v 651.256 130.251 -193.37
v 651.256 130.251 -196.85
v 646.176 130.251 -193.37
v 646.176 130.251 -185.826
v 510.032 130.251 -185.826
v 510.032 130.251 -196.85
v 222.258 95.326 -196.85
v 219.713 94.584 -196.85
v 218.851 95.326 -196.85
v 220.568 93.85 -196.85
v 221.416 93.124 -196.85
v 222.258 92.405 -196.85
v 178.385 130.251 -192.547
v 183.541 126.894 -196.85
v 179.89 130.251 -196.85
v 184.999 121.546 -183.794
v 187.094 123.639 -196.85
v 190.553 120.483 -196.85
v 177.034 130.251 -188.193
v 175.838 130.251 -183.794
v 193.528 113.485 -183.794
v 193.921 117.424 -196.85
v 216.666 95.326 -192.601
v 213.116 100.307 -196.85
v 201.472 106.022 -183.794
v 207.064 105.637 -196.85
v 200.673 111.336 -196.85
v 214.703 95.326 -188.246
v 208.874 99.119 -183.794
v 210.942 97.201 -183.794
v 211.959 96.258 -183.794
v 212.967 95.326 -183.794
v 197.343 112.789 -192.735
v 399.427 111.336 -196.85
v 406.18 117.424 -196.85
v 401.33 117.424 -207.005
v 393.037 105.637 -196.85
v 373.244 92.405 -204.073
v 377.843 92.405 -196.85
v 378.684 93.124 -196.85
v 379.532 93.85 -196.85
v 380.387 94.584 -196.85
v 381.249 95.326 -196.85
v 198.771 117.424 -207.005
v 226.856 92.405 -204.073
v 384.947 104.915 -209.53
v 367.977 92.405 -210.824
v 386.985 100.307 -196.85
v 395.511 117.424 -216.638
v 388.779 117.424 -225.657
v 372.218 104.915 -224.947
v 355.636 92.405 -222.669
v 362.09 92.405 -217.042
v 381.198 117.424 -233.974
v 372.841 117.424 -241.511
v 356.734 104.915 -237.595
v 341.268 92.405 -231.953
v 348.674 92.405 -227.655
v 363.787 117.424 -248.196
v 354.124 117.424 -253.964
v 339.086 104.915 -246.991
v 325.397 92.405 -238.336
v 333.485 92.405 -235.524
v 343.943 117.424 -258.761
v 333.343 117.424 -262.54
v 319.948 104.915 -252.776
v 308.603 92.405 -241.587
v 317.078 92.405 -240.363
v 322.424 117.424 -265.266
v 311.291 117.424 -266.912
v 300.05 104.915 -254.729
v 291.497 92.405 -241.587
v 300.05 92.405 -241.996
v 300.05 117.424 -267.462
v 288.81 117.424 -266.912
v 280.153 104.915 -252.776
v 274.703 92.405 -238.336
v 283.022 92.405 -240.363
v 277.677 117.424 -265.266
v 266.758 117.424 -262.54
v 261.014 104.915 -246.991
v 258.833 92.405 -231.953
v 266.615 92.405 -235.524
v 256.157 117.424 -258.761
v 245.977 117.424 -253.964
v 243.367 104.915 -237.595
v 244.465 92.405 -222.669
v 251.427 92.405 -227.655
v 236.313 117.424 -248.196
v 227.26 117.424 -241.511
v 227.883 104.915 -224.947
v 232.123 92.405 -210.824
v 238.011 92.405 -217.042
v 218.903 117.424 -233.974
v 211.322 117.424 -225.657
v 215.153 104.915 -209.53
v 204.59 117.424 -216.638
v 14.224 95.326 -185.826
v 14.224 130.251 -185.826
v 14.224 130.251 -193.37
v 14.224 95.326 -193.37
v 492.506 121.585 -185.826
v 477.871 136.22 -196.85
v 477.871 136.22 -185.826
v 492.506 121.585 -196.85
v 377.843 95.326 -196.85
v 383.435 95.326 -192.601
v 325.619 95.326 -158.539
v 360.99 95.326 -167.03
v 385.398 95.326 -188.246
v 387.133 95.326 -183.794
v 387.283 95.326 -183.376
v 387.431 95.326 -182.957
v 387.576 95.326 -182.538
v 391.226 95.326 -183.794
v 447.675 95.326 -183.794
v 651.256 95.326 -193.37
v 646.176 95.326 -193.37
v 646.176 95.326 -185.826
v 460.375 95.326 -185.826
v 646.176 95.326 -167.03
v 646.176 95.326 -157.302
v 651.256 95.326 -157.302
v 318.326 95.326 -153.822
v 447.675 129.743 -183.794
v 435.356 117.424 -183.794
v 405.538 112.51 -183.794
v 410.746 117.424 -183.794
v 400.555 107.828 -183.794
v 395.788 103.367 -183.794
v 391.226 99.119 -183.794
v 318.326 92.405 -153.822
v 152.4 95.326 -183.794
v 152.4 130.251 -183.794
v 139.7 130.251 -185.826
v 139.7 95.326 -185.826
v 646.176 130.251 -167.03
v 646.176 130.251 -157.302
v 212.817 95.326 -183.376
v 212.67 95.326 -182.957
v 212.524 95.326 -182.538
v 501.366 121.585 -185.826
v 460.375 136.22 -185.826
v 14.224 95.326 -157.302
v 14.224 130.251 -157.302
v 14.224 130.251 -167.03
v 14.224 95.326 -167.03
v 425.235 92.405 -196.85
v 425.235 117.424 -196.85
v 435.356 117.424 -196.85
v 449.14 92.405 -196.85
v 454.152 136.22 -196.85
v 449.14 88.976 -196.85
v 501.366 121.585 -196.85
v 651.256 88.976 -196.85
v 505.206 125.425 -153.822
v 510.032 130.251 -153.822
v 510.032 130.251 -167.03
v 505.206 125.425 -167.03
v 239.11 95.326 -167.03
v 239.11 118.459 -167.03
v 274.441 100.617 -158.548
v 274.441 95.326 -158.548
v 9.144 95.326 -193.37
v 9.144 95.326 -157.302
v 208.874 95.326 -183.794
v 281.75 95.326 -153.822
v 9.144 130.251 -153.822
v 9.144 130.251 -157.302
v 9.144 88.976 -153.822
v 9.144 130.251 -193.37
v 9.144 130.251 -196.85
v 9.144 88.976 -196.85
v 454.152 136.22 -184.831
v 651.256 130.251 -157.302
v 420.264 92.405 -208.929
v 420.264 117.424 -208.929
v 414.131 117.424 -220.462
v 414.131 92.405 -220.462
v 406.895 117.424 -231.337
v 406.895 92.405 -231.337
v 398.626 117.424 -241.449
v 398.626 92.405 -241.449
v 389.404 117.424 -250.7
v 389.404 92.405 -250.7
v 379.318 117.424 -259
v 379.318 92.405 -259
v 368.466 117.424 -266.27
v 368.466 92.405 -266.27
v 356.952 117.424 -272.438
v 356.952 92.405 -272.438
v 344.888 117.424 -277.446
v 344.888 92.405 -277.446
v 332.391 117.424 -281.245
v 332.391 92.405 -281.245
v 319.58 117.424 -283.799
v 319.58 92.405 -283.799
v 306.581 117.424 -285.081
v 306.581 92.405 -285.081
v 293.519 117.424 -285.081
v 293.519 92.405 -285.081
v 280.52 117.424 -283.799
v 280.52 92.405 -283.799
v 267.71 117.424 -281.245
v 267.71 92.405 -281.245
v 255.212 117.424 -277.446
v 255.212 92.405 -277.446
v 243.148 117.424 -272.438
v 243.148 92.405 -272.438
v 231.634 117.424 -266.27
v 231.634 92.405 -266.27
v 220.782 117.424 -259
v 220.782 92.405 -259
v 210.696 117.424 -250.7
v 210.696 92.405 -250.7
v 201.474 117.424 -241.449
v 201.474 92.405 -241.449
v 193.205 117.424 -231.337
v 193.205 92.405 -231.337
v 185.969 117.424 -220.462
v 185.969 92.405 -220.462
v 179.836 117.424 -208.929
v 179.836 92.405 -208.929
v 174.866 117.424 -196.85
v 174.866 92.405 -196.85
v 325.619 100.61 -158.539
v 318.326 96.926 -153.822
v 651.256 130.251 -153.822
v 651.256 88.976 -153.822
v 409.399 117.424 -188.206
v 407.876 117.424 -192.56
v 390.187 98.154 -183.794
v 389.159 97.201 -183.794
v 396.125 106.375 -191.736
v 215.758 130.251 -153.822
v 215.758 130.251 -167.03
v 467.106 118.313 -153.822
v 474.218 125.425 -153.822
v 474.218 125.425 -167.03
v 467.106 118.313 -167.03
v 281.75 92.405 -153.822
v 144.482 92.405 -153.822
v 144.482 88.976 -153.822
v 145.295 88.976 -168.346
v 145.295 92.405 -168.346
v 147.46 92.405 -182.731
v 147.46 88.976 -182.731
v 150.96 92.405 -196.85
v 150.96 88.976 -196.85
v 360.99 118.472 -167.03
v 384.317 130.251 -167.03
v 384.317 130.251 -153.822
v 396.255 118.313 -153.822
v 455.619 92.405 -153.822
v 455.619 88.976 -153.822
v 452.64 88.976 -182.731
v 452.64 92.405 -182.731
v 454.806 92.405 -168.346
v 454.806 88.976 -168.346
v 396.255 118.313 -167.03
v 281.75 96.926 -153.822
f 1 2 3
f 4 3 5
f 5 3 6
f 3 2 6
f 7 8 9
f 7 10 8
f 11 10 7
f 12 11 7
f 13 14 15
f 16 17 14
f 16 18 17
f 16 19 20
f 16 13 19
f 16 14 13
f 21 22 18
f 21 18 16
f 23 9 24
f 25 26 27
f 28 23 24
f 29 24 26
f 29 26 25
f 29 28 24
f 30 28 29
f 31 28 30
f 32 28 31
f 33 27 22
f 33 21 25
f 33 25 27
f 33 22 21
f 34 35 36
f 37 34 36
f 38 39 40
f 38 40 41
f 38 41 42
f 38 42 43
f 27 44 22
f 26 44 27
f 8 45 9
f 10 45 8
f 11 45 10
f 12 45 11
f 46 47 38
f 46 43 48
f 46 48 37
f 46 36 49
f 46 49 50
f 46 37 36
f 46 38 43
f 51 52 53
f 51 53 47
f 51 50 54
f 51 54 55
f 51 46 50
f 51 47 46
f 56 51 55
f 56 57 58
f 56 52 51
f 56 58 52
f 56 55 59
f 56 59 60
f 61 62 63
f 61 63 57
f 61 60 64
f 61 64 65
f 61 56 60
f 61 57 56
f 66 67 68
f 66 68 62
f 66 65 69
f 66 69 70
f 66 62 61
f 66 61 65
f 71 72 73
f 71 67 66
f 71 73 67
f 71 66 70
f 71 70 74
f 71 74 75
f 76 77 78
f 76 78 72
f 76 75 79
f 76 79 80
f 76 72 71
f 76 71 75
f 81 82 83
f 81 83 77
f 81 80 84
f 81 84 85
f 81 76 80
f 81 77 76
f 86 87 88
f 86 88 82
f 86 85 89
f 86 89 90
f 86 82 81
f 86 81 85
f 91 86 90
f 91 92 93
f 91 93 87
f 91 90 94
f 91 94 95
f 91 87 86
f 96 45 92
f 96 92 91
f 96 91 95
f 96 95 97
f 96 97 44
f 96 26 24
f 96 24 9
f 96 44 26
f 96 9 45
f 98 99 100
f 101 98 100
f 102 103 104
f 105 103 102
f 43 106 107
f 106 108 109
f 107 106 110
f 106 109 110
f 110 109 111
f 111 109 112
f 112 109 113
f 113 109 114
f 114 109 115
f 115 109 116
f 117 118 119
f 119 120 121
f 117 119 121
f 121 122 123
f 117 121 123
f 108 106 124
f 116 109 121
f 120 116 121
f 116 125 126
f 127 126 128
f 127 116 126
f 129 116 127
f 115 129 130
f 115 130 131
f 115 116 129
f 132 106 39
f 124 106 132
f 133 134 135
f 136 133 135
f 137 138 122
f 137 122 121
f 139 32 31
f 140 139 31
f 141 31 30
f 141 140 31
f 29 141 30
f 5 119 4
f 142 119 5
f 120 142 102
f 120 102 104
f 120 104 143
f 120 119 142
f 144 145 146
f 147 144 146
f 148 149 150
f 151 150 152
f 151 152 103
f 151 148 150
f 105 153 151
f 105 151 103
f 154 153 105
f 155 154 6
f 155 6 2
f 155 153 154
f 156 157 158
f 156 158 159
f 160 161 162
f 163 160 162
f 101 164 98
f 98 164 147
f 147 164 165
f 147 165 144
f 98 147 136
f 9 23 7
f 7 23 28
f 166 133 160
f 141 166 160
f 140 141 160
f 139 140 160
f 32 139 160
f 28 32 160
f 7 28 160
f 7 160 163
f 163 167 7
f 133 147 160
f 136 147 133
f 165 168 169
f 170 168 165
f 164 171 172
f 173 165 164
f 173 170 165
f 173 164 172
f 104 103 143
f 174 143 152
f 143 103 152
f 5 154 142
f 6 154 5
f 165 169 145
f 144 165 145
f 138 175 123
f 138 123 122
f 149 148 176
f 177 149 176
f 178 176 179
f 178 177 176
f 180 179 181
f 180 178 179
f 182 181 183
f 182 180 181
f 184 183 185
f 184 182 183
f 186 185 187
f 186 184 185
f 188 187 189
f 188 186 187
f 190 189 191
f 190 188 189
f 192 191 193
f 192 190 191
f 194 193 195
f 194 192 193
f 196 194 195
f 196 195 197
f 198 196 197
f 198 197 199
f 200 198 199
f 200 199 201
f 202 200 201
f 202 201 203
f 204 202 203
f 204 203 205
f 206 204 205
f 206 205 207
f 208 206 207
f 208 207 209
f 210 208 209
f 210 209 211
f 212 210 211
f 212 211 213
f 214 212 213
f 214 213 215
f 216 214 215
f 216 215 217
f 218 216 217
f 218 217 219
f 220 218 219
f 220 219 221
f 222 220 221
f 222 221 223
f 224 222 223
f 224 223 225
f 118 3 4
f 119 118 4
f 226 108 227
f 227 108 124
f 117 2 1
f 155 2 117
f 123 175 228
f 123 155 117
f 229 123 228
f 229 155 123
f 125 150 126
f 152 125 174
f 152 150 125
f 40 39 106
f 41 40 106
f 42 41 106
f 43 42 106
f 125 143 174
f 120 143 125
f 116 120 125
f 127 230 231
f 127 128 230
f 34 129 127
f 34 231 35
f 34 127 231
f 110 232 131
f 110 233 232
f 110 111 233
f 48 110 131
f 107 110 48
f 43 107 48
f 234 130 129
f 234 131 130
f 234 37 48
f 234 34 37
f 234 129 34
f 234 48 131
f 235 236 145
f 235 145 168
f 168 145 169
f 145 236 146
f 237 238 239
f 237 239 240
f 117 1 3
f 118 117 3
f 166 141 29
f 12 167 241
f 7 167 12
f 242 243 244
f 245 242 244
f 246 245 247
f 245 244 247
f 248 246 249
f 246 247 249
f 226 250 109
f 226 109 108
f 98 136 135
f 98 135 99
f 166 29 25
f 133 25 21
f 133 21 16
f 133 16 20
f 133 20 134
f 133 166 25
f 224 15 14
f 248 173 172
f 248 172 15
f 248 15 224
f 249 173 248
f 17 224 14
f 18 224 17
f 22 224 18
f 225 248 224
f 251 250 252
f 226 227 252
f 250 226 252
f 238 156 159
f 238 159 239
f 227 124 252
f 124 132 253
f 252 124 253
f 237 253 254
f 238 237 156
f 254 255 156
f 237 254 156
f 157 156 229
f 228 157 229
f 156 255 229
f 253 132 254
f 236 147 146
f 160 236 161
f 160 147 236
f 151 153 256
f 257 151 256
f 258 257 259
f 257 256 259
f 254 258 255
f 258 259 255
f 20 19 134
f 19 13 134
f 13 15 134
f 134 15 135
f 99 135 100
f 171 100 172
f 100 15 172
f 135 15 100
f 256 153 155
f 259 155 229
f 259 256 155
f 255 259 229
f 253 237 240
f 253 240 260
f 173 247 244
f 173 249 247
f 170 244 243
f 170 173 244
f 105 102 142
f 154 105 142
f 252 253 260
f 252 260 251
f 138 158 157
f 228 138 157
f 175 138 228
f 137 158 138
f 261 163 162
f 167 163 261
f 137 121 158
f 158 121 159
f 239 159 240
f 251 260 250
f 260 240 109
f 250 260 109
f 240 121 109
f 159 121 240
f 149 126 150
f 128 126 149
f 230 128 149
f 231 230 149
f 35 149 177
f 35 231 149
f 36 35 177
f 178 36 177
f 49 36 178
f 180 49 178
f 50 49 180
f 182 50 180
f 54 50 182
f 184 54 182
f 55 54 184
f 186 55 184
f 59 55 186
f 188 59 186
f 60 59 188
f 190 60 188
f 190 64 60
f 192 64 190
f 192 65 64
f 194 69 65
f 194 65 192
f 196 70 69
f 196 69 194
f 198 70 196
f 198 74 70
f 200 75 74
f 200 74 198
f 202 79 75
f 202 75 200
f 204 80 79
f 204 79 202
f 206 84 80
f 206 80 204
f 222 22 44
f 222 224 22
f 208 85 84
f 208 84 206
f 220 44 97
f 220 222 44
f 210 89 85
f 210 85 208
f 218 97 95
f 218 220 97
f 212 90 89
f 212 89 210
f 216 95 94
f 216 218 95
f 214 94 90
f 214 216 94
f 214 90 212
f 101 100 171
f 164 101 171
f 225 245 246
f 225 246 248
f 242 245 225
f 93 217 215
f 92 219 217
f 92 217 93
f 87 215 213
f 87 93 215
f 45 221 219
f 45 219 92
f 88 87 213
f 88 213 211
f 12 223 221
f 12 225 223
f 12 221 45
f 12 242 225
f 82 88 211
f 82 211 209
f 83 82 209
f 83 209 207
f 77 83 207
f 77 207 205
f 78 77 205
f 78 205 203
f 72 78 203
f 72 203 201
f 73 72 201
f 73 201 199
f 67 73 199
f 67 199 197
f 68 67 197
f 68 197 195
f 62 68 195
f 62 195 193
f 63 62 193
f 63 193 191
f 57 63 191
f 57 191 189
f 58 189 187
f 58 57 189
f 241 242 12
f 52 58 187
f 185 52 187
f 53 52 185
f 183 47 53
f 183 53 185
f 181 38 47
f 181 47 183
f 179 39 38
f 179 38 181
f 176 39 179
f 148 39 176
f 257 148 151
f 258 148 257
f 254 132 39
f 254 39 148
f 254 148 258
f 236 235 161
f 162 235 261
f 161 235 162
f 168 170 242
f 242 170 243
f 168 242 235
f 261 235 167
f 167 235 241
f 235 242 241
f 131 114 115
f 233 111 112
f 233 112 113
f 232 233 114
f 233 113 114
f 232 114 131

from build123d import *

# Parameters (mm, degrees)
BOSS_EXTRUDE4_DEPTH   = 41.275
BOSS_EXTRUDE4_2_DEPTH = 41.275
BOSS_EXTRUDE4_3_DEPTH = 41.275
BOSS_EXTRUDE4_4_DEPTH = 41.275
CUT_EXTRUDE12_DEPTH   = 10.668
CUT_EXTRUDE13_DEPTH   = 29.972
CUT_EXTRUDE7_DEPTH    = 44.0276
CUT_EXTRUDE9_DEPTH    = 15.24
BOSS_EXTRUDE6_DEPTH   = 5.969
CUT_EXTRUDE15_DEPTH   = 19.05
REVOLVE1_ANGLE        = 142
CUT_REVOLVE1_ANGLE    = 153
SKETCH39_W            = 642.112
SKETCH39_H            = 43.0276
BOSS_EXTRUDE5_DEPTH   = 6.35
SKETCH38_R            = 155.575
CUT_EXTRUDE14_DEPTH   = 3.429
CUT_EXTRUDE16_DEPTH   = 48.244


with BuildPart() as part:
    # Sketch5 → Boss-Extrude4 (new body)
    with BuildSketch(Plane(origin=(0, 88.9762, 0), x_dir=(1, 0, 0), z_dir=(0, 1, 0))):
        Polygon((281.7495, 153.8224), (9.144, 153.8224), (9.144, 157.3022), (14.224, 157.3022), (14.224, 167.0304), (261.323220327, 167.0304), align=None)
    extrude(amount=BOSS_EXTRUDE4_DEPTH)


with BuildPart() as body_2:
    # Sketch5 → Boss-Extrude4 2 (new body)
    with BuildSketch(Plane(origin=(0, 88.9762, 0), x_dir=(1, 0, 0), z_dir=(0, 1, 0))):
        with BuildLine():
            Line((9.144, 196.85), (230.476735197, 196.85))
            ThreePointArc((230.476735197, 196.85), (228.329031076, 193.294962827), (226.362857042, 189.6364))
            Line((226.362857042, 189.6364), (235.397557666, 183.7944))
            Line((235.397557666, 183.7944), (152.4, 183.7944))
            Line((152.4, 183.7944), (139.7, 185.8264))
            Line((139.7, 185.8264), (14.224, 185.8264))
            Line((14.224, 185.8264), (14.224, 193.3702))
            Line((14.224, 193.3702), (9.144, 193.3702))
            Line((9.144, 193.3702), (9.144, 196.85))
        make_face()
    extrude(amount=BOSS_EXTRUDE4_2_DEPTH)


with BuildPart() as body_3:
    # Sketch5 → Boss-Extrude4 3 (new body)
    with BuildSketch(Plane(origin=(0, 88.9762, 0), x_dir=(1, 0, 0), z_dir=(0, 1, 0))):
        with BuildLine():
            Line((364.677442334, 183.7944), (373.712142958, 189.6364))
            ThreePointArc((373.712142958, 189.6364), (371.745968924, 193.294962827), (369.598264803, 196.85))
            Line((369.598264803, 196.85), (651.256, 196.85))
            Line((651.256, 196.85), (651.256, 193.3702))
            Line((651.256, 193.3702), (646.176, 193.3702))
            Line((646.176, 193.3702), (646.176, 185.8264))
            Line((646.176, 185.8264), (460.375, 185.8264))
            Line((460.375, 185.8264), (447.675, 183.7944))
            Line((447.675, 183.7944), (364.677442334, 183.7944))
        make_face()
    extrude(amount=BOSS_EXTRUDE4_3_DEPTH)


with BuildPart() as body_4:
    # Sketch5 → Boss-Extrude4 4 (new body)
    with BuildSketch(Plane(origin=(0, 88.9762, 0), x_dir=(1, 0, 0), z_dir=(0, 1, 0))):
        Polygon((646.176, 167.0304), (338.751779673, 167.0304), (318.3255, 153.8224), (651.256, 153.8224), (651.256, 157.3022), (646.176, 157.3022), align=None)
    extrude(amount=BOSS_EXTRUDE4_4_DEPTH)


with BuildPart() as cut_extrude12_tool:
    # Sketch22<2> → Cut-Extrude12 (new body)
    with BuildSketch(Plane.XY.offset(-153.8224)):
        Polygon((318.3255, 96.926341572), (384.316635768, 130.2512), (215.758364232, 130.2512), (281.7495, 96.926341572), (281.7495, 92.1512), (318.3255, 92.1512), align=None)
    extrude(amount=-CUT_EXTRUDE12_DEPTH)


with BuildPart() as part_1:
    add(part.part)

    # Cut-Extrude12: cut by cut_extrude12_tool
    add(cut_extrude12_tool.part, mode=Mode.SUBTRACT)


with BuildPart() as body_4_1:
    add(body_4.part)

    # Cut-Extrude12: cut by cut_extrude12_tool
    add(cut_extrude12_tool.part, mode=Mode.SUBTRACT)


with BuildPart() as cut_extrude13_tool:
    # Sketch22<3> → Cut-Extrude13 (new body)
    with BuildSketch(Plane.XY.offset(-153.8224)):
        Polygon((318.3255, 96.926341572), (384.316635768, 130.2512), (215.758364232, 130.2512), (281.7495, 96.926341572), (281.7495, 92.1512), (318.3255, 92.1512), align=None)
    extrude(amount=-CUT_EXTRUDE13_DEPTH)


with BuildPart() as part_2:
    add(part_1.part)

    # Cut-Extrude13: cut by cut_extrude13_tool
    add(cut_extrude13_tool.part, mode=Mode.SUBTRACT)


with BuildPart() as body_4_2:
    add(body_4_1.part)

    # Cut-Extrude13: cut by cut_extrude13_tool
    add(cut_extrude13_tool.part, mode=Mode.SUBTRACT)

    # Sketch26 → Cut-Extrude9 (cut)
    with BuildSketch(Plane.XY.offset(-153.8224)):
        Polygon((510.032, 130.2512), (505.206, 125.4252), (474.218, 125.4252), (467.106, 118.3132), (396.254635768, 118.3132), (384.316635768, 130.2512), align=None)
    extrude(amount=-CUT_EXTRUDE9_DEPTH, mode=Mode.SUBTRACT)


with BuildPart() as cut_extrude7_tool:
    # Sketch22 → Cut-Extrude7 (new body, through all)
    with BuildSketch(Plane.XY.offset(-153.8224)):
        Polygon((318.3255, 96.926341572), (384.316635768, 130.2512), (215.758364232, 130.2512), (281.7495, 96.926341572), (281.7495, 92.1512), (318.3255, 92.1512), align=None)
    extrude(amount=-CUT_EXTRUDE7_DEPTH)


with BuildPart() as body_2_1:
    add(body_2.part)

    # Cut-Extrude7: cut by cut_extrude7_tool
    add(cut_extrude7_tool.part, mode=Mode.SUBTRACT)



with BuildPart() as body_3_1:
    add(body_3.part)

    # Cut-Extrude7: cut by cut_extrude7_tool
    add(cut_extrude7_tool.part, mode=Mode.SUBTRACT)

    # Sketch42 → Boss-Extrude6 (add)
    with BuildSketch(Plane(origin=(0, 130.2512, 0), x_dir=(1, 0, 0), z_dir=(0, 1, 0))):
        Polygon((396.254635768, 196.85), (510.032, 196.85), (510.032, 185.8264), (460.375, 185.8264), (447.675, 183.7944), (396.254635768, 183.7944), align=None)
    extrude(amount=BOSS_EXTRUDE6_DEPTH)

    # Sketch36 → Cut-Extrude15 (cut)
    with BuildSketch(Plane.XY.offset(-196.85)):
        Polygon((435.356, 117.4242), (454.2028, 136.271), (477.819866452, 136.271), (492.506, 121.584866452), (501.365666452, 121.584866452), (510.032, 130.2512), (531.547497997, 151.766697997), (332.480700093, 151.766697997), (332.480700093, 117.4242), align=None)
    extrude(amount=CUT_EXTRUDE15_DEPTH, mode=Mode.SUBTRACT)


with BuildPart() as body_2_2:
    add(body_2_1.part)

    add(body_3_1.part)  # Revolve1 merges body 3
    # Sketch37 → Revolve1 (revolve, symmetric)
    with BuildSketch(Plane(origin=(300.0502, 0, 0), x_dir=(0, 0, -1), z_dir=(1, 0, 0))) as revolve1_sk:
        Polygon((238.506, 88.9762), (285.242, 88.9762), (285.242, 117.4242), (267.462, 117.4242), align=None)
    revolve(axis=Axis((300.0502, 133.091662173, -152.4), (0, -1, 0)), revolution_arc=REVOLVE1_ANGLE / 2)
    revolve(revolve1_sk.sketch, axis=Axis((300.0502, 133.091662173, -152.4), (0, 1, 0)), revolution_arc=REVOLVE1_ANGLE / 2)


with BuildPart() as cut_revolve1_tool:
    # Sketch41 → Cut-Revolve1 (revolve, symmetric)
    with BuildSketch(Plane(origin=(300.0502, 0, 0), x_dir=(0, 0, -1), z_dir=(1, 0, 0))) as cut_revolve1_sk:
        Polygon((290.213142857, 139.7762), (238.506, 88.9762), (171.45, 88.9762), (171.45, 139.7762), align=None)
    revolve(axis=Axis((300.0502, 150.973417034, -152.4), (0, -1, 0)), revolution_arc=CUT_REVOLVE1_ANGLE / 2)
    revolve(cut_revolve1_sk.sketch, axis=Axis((300.0502, 150.973417034, -152.4), (0, 1, 0)), revolution_arc=CUT_REVOLVE1_ANGLE / 2)


with BuildPart() as part_3:
    add(part_2.part)

    # Cut-Revolve1: cut by cut_revolve1_tool
    add(cut_revolve1_tool.part, mode=Mode.SUBTRACT)



with BuildPart() as body_2_3:
    add(body_2_2.part)

    # Cut-Revolve1: cut by cut_revolve1_tool
    add(cut_revolve1_tool.part, mode=Mode.SUBTRACT)


with BuildPart() as body_4_3:
    add(body_4_2.part)

    # Cut-Revolve1: cut by cut_revolve1_tool
    add(cut_revolve1_tool.part, mode=Mode.SUBTRACT)


with BuildPart() as part_4:
    add(part_3.part)

    add(body_2_3.part)  # Boss-Extrude5 merges body 2

    add(body_4_3.part)  # Boss-Extrude5 merges body 4
    # Sketch39 → Boss-Extrude5 (add)
    with BuildSketch(Plane.XZ.offset(-88.9762)):
        with Locations((330.2, -175.3362)):
            Rectangle(SKETCH39_W, SKETCH39_H)
    extrude(amount=-BOSS_EXTRUDE5_DEPTH)

    # Sketch38 → Cut-Extrude14 (cut)
    with BuildSketch(Plane.XZ.offset(-88.9762)):
        with Locations((300.0502, -152.4)):
            Circle(SKETCH38_R)
    extrude(amount=-CUT_EXTRUDE14_DEPTH, mode=Mode.SUBTRACT)

    # Sketch43 → Cut-Extrude16 (cut, through all)
    with BuildSketch(Plane(origin=(0, 136.2202, 0), x_dir=(1, 0, 0), z_dir=(0, 1, 0))):
        with BuildLine():
            Line((281.7495, 153.8224), (222.257640496, 196.85))
            ThreePointArc((222.257640496, 196.85), (300.0502, 241.996232143), (377.842759504, 196.85))
            Line((377.842759504, 196.85), (318.3255, 153.8224))
            Line((318.3255, 153.8224), (281.7495, 153.8224))
        make_face()
    extrude(amount=-CUT_EXTRUDE16_DEPTH, mode=Mode.SUBTRACT)


solid = part_4.part
